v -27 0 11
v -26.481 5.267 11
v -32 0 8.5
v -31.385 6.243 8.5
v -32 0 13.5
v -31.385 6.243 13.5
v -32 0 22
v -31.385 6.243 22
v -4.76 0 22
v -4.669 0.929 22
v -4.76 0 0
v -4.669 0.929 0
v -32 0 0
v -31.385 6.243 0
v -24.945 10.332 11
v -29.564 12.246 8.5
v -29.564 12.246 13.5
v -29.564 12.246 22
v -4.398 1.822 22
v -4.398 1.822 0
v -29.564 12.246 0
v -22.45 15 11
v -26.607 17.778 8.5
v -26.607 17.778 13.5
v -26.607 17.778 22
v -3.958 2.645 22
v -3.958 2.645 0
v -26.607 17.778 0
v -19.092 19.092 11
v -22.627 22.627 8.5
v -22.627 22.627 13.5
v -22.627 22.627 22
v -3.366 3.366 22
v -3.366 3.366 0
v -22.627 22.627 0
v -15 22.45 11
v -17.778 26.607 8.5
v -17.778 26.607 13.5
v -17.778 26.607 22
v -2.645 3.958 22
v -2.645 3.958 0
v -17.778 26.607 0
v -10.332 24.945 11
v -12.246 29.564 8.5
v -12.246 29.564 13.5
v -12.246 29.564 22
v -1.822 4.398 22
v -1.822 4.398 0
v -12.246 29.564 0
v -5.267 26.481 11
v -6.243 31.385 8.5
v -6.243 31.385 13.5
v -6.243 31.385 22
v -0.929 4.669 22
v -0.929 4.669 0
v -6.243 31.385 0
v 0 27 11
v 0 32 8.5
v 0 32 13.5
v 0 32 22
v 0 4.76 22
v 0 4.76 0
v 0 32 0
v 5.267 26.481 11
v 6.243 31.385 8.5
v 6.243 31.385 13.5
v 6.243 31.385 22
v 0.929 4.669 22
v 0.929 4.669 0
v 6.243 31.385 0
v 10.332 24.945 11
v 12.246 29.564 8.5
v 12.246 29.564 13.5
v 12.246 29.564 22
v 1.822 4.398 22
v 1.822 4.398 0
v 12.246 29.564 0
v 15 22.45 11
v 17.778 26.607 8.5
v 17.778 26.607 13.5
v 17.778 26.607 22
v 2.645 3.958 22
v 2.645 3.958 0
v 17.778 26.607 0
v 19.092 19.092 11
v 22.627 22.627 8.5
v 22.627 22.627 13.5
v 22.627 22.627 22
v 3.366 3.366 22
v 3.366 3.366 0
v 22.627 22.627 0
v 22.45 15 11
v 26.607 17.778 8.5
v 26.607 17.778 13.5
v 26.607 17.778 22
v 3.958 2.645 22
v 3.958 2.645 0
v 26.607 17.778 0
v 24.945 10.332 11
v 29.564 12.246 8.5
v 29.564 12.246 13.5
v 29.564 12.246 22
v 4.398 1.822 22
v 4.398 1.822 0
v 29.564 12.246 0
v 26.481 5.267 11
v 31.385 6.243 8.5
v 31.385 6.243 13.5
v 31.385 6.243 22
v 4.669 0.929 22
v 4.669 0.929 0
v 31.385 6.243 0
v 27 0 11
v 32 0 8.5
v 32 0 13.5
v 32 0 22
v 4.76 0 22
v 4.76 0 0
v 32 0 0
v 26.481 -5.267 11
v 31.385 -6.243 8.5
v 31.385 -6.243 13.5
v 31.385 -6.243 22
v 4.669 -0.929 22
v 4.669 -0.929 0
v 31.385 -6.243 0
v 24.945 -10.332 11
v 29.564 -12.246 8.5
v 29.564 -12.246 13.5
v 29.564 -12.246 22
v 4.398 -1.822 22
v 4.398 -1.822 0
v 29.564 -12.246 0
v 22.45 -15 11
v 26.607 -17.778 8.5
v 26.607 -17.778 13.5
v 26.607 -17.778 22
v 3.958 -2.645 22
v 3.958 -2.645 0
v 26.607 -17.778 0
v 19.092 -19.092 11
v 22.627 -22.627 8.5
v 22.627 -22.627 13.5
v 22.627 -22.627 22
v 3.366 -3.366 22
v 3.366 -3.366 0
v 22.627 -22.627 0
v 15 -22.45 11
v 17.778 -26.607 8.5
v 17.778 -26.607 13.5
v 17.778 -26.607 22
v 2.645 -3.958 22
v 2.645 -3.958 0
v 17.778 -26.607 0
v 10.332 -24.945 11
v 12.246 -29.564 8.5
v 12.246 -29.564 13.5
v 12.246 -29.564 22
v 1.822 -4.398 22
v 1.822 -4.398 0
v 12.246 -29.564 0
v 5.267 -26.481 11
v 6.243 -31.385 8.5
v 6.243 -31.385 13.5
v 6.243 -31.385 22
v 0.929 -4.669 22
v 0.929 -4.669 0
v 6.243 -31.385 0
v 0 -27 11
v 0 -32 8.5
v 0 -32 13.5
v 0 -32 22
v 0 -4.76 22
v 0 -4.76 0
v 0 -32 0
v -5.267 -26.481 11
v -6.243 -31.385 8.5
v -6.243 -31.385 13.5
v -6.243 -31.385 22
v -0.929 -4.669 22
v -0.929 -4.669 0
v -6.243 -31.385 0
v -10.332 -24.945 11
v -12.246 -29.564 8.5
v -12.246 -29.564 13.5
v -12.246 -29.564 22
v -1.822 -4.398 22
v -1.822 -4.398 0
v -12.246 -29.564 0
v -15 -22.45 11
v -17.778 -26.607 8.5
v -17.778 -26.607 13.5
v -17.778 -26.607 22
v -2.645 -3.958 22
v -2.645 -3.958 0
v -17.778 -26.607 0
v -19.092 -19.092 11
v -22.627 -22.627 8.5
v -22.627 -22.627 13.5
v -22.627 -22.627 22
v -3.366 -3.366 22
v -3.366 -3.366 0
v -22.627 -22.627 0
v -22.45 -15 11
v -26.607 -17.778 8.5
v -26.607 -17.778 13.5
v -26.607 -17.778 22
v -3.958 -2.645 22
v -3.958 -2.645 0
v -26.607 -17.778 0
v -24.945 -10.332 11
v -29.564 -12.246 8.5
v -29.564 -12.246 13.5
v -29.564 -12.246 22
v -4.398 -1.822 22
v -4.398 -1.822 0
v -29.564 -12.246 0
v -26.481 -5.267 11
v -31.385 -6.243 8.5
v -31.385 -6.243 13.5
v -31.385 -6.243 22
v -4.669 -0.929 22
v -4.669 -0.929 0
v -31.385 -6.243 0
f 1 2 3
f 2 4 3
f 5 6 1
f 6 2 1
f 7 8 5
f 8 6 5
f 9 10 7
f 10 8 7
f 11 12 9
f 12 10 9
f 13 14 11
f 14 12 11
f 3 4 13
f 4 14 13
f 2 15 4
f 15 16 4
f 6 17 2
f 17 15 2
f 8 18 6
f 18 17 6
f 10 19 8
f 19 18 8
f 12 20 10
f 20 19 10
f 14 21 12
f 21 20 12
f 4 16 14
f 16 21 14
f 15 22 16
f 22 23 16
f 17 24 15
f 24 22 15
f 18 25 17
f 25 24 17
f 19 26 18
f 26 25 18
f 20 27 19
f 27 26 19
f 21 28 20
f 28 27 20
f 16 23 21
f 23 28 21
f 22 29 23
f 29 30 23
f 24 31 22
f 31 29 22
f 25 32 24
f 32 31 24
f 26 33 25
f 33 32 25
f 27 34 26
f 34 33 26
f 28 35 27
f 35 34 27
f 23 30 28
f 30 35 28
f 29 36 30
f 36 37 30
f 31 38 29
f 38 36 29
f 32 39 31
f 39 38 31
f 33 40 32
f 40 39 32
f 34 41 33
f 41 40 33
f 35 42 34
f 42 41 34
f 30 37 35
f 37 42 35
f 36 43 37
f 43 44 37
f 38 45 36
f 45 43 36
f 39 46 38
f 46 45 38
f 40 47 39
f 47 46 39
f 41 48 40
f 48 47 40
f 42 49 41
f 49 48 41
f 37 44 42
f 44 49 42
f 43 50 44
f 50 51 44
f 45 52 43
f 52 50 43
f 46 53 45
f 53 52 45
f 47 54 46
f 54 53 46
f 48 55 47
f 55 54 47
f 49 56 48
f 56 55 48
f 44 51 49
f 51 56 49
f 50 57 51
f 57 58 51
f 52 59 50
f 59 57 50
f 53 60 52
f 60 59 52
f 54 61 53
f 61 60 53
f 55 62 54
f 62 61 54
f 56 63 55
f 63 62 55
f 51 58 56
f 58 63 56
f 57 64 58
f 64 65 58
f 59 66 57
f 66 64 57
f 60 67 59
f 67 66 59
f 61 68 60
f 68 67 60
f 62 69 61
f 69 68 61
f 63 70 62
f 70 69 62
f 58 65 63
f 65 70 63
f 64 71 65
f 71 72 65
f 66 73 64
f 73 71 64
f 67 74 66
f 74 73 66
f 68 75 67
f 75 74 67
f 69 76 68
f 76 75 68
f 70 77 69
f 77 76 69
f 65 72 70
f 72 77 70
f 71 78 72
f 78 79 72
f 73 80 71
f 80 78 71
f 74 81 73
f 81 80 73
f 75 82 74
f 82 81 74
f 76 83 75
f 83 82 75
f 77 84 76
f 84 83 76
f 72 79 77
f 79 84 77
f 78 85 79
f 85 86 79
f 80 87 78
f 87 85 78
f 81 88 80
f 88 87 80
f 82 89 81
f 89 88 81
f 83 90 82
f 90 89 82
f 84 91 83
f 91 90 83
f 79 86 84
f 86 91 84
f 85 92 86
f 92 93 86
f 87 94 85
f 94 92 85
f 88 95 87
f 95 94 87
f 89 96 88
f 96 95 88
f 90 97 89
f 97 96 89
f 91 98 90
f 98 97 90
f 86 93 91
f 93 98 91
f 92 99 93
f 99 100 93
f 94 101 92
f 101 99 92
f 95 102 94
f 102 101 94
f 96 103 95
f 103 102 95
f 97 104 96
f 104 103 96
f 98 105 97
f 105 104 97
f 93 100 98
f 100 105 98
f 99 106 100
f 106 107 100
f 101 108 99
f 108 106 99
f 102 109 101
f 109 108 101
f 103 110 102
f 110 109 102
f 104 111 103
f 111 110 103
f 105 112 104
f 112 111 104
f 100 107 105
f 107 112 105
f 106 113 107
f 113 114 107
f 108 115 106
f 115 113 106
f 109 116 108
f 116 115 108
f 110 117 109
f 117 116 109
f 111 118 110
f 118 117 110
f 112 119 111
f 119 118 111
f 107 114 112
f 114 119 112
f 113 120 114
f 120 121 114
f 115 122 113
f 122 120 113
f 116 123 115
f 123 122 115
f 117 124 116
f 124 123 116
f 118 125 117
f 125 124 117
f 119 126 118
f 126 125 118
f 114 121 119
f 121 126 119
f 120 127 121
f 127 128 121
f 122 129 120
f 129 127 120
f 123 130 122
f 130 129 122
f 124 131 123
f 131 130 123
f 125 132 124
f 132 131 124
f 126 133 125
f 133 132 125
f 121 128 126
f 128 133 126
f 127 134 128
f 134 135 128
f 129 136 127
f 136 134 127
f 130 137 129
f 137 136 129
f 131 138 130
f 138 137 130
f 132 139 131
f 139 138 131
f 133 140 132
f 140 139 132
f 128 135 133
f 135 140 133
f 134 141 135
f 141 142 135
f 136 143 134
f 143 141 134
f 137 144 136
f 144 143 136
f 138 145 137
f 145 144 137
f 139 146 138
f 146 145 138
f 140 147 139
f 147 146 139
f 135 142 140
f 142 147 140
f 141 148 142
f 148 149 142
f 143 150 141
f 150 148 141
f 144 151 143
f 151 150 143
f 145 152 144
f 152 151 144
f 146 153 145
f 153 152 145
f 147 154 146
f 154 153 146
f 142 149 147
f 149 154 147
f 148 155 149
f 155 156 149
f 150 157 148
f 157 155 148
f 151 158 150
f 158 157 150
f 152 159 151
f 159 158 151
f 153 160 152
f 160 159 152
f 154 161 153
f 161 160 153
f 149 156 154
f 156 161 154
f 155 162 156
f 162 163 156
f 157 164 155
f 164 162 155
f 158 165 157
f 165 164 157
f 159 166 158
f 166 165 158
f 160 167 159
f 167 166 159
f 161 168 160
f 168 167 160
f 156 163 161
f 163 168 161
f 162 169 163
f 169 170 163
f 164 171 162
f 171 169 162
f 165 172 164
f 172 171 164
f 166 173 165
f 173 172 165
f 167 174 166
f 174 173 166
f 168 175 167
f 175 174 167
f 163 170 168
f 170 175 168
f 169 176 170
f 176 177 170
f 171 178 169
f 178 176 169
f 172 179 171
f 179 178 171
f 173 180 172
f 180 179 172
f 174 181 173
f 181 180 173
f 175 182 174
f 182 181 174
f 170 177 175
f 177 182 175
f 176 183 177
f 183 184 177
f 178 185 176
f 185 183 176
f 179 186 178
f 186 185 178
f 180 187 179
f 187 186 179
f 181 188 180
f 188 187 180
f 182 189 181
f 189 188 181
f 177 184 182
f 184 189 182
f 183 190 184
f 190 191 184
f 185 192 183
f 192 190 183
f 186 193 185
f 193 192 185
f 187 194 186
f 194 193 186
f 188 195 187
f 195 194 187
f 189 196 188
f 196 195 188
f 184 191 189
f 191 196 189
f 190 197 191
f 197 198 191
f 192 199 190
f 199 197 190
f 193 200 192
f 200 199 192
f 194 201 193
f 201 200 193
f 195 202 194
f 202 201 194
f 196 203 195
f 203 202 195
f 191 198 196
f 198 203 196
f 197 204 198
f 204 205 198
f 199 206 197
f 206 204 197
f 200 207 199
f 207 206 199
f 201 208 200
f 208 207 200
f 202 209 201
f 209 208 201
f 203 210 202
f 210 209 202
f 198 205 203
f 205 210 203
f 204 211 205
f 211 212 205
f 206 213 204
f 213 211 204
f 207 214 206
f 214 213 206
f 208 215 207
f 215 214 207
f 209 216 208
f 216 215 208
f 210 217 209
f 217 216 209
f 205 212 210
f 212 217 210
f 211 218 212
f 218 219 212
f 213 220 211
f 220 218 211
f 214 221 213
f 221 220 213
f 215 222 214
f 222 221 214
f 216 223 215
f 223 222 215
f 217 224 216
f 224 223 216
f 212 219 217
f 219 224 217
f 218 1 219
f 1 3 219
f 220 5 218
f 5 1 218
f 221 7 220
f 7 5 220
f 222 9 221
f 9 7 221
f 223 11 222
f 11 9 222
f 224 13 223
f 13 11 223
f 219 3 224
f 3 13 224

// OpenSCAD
$fn = 32;

// ----------------------------------------------------------------------
// Belt roller: 64 mm barrel, 22 mm wide, bore 9.52 mm
// ----------------------------------------------------------------------

// --- parameters (mm) ---
bore_d = 9.52;            // bore
barrel_d = 64;            // barrel diameter
roller_w = 22;            // roller width
groove_w = 5;             // guide groove width
groove_d = 5;             // guide groove depth

roller_profile = [[4.76, 0], [32, 0], [32, 8.5], [27, 11], [32, 13.5], [32, 22], [4.76, 22]];

/* the profile stays clear of the axis, so the bore comes out of the revolve */
rotate_extrude() polygon(roller_profile);
